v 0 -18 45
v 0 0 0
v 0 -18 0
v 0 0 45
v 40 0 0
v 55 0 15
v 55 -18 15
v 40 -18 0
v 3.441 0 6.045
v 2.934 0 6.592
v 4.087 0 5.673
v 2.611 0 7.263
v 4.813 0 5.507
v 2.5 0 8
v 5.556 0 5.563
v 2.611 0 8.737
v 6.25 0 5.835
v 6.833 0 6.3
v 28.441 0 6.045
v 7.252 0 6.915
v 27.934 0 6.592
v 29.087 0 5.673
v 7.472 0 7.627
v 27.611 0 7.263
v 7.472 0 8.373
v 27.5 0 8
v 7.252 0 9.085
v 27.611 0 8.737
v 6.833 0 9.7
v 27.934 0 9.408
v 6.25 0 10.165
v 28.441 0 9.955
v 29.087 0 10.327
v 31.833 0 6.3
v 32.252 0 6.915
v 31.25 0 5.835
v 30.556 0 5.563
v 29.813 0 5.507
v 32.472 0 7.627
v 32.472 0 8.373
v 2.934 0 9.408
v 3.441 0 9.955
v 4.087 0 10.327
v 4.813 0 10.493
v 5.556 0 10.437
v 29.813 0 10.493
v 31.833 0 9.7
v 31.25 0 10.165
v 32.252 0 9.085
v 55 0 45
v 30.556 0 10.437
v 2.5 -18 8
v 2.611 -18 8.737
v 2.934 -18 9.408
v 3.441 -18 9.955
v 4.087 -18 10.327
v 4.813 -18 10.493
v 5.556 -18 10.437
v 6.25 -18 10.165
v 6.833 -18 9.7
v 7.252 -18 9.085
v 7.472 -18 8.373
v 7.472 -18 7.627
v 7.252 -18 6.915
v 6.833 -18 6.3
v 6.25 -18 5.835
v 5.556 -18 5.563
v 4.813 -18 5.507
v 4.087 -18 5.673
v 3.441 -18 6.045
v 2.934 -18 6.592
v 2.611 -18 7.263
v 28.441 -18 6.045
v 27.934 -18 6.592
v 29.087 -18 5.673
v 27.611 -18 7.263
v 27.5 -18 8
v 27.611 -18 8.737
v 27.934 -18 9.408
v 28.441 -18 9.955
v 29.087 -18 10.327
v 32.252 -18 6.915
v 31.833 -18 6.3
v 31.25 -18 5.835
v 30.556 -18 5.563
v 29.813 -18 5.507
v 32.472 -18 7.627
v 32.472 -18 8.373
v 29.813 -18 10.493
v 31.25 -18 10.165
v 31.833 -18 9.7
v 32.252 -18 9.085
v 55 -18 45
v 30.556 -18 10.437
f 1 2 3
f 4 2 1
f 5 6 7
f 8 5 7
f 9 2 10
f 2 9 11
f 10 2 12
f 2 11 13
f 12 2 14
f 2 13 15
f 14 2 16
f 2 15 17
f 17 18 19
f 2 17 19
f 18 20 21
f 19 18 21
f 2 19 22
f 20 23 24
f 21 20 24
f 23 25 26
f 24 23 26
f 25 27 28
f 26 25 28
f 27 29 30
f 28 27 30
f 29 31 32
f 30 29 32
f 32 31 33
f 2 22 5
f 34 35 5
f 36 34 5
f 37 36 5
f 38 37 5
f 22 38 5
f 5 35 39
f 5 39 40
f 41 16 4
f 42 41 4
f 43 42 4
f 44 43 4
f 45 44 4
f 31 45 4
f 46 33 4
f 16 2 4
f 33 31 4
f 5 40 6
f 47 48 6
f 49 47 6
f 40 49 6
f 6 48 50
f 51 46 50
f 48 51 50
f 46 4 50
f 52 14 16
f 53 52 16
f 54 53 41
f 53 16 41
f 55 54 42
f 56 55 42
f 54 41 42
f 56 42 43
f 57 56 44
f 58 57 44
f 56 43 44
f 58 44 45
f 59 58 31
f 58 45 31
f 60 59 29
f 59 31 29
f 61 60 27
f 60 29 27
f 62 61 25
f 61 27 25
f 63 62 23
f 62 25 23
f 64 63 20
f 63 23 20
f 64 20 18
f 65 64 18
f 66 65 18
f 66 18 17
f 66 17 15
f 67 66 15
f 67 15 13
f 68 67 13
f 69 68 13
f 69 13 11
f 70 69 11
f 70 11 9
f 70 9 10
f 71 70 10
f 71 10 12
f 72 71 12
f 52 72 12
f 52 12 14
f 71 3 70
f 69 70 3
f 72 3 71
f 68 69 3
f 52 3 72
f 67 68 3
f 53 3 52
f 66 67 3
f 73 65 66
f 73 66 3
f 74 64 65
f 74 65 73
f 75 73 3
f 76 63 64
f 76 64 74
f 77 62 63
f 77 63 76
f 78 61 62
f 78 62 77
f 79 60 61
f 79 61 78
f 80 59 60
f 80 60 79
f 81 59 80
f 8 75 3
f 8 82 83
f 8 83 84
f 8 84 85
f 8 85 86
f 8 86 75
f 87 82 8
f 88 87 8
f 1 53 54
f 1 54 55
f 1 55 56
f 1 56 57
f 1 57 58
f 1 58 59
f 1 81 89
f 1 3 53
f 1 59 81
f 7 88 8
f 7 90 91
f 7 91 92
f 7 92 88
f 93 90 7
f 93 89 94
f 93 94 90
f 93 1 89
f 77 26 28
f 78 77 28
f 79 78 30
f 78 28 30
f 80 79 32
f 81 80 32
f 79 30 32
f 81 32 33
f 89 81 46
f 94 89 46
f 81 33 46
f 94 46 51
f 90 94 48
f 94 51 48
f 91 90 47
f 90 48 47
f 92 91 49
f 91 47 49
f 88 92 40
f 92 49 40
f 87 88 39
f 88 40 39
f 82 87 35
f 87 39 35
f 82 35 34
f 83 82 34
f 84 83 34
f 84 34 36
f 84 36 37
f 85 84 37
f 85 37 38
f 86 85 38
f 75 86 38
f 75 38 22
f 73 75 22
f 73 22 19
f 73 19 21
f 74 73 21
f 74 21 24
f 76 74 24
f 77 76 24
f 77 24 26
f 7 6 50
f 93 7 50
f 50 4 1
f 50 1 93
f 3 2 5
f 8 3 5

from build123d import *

# Parameters (mm, degrees)
F0_W     = 55
F0_H     = 45
F1_DEPTH = 18
F3_SIZE  = 15
F4_D     = 5


with BuildPart() as f1:
    # F0 (on Front) → F1 (new body)
    with BuildSketch(Plane.XZ):
        with Locations((27.5, 22.5)):
            Rectangle(F0_W, F0_H)
    extrude(amount=F1_DEPTH)

    # F3
    f3_edges = [f1.edges().sort_by_distance(p)[0] for p in [
        (55, -9, 0),
    ]]
    chamfer(f3_edges, length=F3_SIZE)

    # F4 (through all)
    with Locations(Plane.XZ.offset(18)):
        with Locations((30, 8), (5, 8)):
            Hole(F4_D / 2)


solid = f1.part
